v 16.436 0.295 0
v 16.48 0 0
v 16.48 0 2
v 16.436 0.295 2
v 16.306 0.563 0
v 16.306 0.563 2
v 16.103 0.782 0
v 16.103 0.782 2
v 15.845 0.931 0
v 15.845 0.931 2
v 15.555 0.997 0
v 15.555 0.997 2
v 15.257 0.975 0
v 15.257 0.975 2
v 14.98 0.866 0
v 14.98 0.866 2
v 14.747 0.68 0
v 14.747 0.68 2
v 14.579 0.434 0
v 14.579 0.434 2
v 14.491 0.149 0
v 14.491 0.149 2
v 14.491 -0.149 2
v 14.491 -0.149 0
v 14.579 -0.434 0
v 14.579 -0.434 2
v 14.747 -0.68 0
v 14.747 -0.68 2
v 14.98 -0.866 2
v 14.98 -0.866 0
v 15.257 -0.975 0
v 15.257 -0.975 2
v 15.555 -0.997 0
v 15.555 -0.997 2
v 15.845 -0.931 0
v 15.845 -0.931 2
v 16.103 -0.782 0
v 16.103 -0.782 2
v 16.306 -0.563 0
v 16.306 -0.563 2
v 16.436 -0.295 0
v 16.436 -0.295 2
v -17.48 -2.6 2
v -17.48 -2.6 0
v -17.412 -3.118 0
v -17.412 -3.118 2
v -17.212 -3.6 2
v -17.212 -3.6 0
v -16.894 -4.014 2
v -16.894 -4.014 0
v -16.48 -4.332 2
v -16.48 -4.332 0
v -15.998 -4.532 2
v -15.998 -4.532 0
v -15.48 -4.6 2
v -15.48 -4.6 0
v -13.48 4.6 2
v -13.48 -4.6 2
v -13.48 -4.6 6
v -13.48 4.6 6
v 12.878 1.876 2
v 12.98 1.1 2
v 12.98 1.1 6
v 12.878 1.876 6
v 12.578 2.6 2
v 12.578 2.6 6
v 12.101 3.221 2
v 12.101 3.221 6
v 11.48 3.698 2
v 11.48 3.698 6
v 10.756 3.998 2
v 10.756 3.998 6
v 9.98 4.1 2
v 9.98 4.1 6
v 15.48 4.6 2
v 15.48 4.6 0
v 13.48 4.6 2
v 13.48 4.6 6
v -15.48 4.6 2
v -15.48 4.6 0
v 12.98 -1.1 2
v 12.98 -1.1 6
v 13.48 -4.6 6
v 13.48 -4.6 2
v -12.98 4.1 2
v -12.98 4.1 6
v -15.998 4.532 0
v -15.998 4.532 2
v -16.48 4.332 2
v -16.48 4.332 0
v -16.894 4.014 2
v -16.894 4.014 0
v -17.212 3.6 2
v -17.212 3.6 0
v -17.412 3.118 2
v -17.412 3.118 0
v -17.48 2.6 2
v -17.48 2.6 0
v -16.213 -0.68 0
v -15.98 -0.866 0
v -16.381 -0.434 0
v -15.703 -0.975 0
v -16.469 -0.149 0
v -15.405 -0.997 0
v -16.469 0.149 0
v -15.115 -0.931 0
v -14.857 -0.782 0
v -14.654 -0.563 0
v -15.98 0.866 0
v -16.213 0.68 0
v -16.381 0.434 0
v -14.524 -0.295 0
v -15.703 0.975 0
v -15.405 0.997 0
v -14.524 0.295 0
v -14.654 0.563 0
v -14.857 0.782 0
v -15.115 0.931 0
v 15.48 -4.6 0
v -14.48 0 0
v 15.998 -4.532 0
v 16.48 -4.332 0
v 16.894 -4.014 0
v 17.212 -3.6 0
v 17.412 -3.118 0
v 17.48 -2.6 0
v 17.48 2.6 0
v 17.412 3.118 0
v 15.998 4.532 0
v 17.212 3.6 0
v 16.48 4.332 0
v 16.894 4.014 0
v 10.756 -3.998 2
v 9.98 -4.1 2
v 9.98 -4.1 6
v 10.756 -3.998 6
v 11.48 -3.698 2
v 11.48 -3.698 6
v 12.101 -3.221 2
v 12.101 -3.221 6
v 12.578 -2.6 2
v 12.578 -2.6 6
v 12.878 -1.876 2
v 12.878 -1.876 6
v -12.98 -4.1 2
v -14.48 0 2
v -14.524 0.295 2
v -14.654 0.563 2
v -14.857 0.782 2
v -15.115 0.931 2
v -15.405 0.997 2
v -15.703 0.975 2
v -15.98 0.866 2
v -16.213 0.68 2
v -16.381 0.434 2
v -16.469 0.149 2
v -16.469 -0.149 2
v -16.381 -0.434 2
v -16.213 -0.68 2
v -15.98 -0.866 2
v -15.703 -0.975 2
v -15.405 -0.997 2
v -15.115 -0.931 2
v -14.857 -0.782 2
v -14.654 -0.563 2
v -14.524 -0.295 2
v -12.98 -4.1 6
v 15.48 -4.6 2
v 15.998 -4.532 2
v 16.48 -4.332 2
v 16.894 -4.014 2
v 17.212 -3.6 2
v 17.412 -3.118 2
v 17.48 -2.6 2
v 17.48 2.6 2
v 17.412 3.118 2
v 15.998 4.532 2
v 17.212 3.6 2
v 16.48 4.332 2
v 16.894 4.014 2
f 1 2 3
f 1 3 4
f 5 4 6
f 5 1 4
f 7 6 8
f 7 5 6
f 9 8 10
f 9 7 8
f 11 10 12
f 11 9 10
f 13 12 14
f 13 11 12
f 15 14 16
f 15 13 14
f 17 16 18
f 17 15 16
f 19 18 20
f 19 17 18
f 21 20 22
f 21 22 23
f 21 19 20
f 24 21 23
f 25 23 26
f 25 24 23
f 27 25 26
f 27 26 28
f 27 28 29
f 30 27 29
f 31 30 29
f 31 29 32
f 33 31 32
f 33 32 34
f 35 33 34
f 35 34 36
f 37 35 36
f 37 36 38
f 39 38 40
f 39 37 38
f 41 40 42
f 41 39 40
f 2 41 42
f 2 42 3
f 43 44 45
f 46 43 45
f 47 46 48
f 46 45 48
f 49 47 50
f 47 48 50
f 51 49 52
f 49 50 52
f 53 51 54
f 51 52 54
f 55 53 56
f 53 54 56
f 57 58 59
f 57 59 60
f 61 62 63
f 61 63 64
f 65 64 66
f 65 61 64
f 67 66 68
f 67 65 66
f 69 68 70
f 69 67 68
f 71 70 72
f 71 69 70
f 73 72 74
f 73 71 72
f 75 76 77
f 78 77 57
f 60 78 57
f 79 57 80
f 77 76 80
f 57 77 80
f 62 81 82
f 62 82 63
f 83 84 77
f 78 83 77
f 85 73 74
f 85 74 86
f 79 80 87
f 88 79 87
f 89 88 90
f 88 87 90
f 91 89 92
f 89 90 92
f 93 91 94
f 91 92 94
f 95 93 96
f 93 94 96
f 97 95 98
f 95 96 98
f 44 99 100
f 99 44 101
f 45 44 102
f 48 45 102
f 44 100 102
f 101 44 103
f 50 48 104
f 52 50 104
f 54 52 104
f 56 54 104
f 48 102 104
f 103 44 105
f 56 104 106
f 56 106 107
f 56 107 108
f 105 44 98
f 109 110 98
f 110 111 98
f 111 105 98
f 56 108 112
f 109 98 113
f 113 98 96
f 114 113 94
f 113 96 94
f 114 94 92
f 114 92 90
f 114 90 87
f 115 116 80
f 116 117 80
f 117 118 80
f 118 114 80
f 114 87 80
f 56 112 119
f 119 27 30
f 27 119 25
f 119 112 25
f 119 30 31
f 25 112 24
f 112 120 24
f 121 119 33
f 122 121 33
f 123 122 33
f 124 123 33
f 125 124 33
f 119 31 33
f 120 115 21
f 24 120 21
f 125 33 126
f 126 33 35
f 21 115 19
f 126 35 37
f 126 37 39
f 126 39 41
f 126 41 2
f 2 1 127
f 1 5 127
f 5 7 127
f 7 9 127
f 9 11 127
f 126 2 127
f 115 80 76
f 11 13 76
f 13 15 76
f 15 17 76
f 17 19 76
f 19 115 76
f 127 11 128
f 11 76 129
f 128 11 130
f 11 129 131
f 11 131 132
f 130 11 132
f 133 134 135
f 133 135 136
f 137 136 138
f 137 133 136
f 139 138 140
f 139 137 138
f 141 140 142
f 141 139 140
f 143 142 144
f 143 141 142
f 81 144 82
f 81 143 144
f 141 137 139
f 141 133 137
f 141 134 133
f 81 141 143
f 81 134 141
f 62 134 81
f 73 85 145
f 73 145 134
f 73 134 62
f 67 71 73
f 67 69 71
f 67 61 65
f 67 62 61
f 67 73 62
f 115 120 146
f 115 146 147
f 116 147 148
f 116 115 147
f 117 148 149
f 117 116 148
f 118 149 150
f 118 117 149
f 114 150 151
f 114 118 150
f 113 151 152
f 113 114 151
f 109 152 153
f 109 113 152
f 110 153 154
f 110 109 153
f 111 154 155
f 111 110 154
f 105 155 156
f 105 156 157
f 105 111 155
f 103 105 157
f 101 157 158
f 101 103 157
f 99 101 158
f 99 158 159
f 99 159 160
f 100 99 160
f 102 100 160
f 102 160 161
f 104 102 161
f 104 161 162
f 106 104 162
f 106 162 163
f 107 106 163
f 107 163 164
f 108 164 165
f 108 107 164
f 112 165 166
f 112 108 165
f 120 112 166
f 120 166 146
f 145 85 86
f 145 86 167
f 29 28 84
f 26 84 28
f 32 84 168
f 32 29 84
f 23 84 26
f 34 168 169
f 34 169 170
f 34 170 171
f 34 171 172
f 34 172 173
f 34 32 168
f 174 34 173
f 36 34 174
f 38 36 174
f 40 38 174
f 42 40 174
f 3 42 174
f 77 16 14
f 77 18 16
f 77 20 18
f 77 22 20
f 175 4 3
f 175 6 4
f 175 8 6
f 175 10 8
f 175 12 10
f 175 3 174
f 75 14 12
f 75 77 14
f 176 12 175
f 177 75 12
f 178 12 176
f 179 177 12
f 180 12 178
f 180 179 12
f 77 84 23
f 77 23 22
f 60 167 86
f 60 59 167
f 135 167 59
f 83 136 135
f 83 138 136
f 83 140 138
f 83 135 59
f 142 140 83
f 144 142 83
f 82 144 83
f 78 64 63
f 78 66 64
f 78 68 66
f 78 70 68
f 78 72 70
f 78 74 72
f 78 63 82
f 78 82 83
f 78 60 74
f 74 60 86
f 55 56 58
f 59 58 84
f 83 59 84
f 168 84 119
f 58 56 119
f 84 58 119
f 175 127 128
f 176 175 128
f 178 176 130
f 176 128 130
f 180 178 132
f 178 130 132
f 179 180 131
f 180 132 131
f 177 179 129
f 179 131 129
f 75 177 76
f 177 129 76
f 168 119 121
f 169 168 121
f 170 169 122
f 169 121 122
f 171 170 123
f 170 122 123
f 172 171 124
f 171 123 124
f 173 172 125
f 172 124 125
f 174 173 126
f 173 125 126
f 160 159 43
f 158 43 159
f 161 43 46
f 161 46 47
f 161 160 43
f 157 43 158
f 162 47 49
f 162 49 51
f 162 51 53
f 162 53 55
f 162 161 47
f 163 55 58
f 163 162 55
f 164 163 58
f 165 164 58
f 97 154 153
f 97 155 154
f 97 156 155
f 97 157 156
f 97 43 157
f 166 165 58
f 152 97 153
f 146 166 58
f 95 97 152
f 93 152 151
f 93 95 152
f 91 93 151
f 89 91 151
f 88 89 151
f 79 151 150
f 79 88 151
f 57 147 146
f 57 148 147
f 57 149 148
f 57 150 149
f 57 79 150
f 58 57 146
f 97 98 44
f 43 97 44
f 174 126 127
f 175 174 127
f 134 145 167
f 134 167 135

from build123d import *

# Parameters (mm, degrees)
SKETCH1_R           = 1
BOSS_EXTRUDE1_DEPTH = 2
SKETCH2_W           = 26.96
SKETCH2_H           = 9.2
BOSS_EXTRUDE2_DEPTH = 6


with BuildPart() as part:
    # Sketch1 → Boss-Extrude1 (new body)
    with BuildSketch(Plane.XY):
        with BuildLine():
            Line((-15.48, -4.6), (15.48, -4.6))
            ThreePointArc((15.48, -4.6), (16.894213562, -4.014213562), (17.48, -2.6))
            Line((17.48, -2.6), (17.48, 2.6))
            ThreePointArc((17.48, 2.6), (16.894213562, 4.014213562), (15.48, 4.6))
            Line((15.48, 4.6), (-15.48, 4.6))
            ThreePointArc((-15.48, 4.6), (-16.894213562, 4.014213562), (-17.48, 2.6))
            Line((-17.48, 2.6), (-17.48, -2.6))
            ThreePointArc((-17.48, -2.6), (-16.894213562, -4.014213562), (-15.48, -4.6))
        make_face()
        with Locations((-15.48, 0)):
            Circle(SKETCH1_R, mode=Mode.SUBTRACT)
        with Locations((15.48, 0)):
            Circle(SKETCH1_R, mode=Mode.SUBTRACT)
    extrude(amount=BOSS_EXTRUDE1_DEPTH)

    # Sketch2 → Boss-Extrude2 (add)
    with BuildSketch(Plane.XY):
        Rectangle(SKETCH2_W, SKETCH2_H)
        with BuildLine():
            Line((-12.98, 4.1), (-12.98, -4.1))
            Line((-12.98, -4.1), (9.98, -4.1))
            ThreePointArc((9.98, -4.1), (12.101320344, -3.221320344), (12.98, -1.1))
            Line((12.98, -1.1), (12.98, 1.1))
            ThreePointArc((12.98, 1.1), (12.101320344, 3.221320344), (9.98, 4.1))
            Line((9.98, 4.1), (-12.98, 4.1))
        make_face(mode=Mode.SUBTRACT)
    extrude(amount=BOSS_EXTRUDE2_DEPTH)


solid = part.part
